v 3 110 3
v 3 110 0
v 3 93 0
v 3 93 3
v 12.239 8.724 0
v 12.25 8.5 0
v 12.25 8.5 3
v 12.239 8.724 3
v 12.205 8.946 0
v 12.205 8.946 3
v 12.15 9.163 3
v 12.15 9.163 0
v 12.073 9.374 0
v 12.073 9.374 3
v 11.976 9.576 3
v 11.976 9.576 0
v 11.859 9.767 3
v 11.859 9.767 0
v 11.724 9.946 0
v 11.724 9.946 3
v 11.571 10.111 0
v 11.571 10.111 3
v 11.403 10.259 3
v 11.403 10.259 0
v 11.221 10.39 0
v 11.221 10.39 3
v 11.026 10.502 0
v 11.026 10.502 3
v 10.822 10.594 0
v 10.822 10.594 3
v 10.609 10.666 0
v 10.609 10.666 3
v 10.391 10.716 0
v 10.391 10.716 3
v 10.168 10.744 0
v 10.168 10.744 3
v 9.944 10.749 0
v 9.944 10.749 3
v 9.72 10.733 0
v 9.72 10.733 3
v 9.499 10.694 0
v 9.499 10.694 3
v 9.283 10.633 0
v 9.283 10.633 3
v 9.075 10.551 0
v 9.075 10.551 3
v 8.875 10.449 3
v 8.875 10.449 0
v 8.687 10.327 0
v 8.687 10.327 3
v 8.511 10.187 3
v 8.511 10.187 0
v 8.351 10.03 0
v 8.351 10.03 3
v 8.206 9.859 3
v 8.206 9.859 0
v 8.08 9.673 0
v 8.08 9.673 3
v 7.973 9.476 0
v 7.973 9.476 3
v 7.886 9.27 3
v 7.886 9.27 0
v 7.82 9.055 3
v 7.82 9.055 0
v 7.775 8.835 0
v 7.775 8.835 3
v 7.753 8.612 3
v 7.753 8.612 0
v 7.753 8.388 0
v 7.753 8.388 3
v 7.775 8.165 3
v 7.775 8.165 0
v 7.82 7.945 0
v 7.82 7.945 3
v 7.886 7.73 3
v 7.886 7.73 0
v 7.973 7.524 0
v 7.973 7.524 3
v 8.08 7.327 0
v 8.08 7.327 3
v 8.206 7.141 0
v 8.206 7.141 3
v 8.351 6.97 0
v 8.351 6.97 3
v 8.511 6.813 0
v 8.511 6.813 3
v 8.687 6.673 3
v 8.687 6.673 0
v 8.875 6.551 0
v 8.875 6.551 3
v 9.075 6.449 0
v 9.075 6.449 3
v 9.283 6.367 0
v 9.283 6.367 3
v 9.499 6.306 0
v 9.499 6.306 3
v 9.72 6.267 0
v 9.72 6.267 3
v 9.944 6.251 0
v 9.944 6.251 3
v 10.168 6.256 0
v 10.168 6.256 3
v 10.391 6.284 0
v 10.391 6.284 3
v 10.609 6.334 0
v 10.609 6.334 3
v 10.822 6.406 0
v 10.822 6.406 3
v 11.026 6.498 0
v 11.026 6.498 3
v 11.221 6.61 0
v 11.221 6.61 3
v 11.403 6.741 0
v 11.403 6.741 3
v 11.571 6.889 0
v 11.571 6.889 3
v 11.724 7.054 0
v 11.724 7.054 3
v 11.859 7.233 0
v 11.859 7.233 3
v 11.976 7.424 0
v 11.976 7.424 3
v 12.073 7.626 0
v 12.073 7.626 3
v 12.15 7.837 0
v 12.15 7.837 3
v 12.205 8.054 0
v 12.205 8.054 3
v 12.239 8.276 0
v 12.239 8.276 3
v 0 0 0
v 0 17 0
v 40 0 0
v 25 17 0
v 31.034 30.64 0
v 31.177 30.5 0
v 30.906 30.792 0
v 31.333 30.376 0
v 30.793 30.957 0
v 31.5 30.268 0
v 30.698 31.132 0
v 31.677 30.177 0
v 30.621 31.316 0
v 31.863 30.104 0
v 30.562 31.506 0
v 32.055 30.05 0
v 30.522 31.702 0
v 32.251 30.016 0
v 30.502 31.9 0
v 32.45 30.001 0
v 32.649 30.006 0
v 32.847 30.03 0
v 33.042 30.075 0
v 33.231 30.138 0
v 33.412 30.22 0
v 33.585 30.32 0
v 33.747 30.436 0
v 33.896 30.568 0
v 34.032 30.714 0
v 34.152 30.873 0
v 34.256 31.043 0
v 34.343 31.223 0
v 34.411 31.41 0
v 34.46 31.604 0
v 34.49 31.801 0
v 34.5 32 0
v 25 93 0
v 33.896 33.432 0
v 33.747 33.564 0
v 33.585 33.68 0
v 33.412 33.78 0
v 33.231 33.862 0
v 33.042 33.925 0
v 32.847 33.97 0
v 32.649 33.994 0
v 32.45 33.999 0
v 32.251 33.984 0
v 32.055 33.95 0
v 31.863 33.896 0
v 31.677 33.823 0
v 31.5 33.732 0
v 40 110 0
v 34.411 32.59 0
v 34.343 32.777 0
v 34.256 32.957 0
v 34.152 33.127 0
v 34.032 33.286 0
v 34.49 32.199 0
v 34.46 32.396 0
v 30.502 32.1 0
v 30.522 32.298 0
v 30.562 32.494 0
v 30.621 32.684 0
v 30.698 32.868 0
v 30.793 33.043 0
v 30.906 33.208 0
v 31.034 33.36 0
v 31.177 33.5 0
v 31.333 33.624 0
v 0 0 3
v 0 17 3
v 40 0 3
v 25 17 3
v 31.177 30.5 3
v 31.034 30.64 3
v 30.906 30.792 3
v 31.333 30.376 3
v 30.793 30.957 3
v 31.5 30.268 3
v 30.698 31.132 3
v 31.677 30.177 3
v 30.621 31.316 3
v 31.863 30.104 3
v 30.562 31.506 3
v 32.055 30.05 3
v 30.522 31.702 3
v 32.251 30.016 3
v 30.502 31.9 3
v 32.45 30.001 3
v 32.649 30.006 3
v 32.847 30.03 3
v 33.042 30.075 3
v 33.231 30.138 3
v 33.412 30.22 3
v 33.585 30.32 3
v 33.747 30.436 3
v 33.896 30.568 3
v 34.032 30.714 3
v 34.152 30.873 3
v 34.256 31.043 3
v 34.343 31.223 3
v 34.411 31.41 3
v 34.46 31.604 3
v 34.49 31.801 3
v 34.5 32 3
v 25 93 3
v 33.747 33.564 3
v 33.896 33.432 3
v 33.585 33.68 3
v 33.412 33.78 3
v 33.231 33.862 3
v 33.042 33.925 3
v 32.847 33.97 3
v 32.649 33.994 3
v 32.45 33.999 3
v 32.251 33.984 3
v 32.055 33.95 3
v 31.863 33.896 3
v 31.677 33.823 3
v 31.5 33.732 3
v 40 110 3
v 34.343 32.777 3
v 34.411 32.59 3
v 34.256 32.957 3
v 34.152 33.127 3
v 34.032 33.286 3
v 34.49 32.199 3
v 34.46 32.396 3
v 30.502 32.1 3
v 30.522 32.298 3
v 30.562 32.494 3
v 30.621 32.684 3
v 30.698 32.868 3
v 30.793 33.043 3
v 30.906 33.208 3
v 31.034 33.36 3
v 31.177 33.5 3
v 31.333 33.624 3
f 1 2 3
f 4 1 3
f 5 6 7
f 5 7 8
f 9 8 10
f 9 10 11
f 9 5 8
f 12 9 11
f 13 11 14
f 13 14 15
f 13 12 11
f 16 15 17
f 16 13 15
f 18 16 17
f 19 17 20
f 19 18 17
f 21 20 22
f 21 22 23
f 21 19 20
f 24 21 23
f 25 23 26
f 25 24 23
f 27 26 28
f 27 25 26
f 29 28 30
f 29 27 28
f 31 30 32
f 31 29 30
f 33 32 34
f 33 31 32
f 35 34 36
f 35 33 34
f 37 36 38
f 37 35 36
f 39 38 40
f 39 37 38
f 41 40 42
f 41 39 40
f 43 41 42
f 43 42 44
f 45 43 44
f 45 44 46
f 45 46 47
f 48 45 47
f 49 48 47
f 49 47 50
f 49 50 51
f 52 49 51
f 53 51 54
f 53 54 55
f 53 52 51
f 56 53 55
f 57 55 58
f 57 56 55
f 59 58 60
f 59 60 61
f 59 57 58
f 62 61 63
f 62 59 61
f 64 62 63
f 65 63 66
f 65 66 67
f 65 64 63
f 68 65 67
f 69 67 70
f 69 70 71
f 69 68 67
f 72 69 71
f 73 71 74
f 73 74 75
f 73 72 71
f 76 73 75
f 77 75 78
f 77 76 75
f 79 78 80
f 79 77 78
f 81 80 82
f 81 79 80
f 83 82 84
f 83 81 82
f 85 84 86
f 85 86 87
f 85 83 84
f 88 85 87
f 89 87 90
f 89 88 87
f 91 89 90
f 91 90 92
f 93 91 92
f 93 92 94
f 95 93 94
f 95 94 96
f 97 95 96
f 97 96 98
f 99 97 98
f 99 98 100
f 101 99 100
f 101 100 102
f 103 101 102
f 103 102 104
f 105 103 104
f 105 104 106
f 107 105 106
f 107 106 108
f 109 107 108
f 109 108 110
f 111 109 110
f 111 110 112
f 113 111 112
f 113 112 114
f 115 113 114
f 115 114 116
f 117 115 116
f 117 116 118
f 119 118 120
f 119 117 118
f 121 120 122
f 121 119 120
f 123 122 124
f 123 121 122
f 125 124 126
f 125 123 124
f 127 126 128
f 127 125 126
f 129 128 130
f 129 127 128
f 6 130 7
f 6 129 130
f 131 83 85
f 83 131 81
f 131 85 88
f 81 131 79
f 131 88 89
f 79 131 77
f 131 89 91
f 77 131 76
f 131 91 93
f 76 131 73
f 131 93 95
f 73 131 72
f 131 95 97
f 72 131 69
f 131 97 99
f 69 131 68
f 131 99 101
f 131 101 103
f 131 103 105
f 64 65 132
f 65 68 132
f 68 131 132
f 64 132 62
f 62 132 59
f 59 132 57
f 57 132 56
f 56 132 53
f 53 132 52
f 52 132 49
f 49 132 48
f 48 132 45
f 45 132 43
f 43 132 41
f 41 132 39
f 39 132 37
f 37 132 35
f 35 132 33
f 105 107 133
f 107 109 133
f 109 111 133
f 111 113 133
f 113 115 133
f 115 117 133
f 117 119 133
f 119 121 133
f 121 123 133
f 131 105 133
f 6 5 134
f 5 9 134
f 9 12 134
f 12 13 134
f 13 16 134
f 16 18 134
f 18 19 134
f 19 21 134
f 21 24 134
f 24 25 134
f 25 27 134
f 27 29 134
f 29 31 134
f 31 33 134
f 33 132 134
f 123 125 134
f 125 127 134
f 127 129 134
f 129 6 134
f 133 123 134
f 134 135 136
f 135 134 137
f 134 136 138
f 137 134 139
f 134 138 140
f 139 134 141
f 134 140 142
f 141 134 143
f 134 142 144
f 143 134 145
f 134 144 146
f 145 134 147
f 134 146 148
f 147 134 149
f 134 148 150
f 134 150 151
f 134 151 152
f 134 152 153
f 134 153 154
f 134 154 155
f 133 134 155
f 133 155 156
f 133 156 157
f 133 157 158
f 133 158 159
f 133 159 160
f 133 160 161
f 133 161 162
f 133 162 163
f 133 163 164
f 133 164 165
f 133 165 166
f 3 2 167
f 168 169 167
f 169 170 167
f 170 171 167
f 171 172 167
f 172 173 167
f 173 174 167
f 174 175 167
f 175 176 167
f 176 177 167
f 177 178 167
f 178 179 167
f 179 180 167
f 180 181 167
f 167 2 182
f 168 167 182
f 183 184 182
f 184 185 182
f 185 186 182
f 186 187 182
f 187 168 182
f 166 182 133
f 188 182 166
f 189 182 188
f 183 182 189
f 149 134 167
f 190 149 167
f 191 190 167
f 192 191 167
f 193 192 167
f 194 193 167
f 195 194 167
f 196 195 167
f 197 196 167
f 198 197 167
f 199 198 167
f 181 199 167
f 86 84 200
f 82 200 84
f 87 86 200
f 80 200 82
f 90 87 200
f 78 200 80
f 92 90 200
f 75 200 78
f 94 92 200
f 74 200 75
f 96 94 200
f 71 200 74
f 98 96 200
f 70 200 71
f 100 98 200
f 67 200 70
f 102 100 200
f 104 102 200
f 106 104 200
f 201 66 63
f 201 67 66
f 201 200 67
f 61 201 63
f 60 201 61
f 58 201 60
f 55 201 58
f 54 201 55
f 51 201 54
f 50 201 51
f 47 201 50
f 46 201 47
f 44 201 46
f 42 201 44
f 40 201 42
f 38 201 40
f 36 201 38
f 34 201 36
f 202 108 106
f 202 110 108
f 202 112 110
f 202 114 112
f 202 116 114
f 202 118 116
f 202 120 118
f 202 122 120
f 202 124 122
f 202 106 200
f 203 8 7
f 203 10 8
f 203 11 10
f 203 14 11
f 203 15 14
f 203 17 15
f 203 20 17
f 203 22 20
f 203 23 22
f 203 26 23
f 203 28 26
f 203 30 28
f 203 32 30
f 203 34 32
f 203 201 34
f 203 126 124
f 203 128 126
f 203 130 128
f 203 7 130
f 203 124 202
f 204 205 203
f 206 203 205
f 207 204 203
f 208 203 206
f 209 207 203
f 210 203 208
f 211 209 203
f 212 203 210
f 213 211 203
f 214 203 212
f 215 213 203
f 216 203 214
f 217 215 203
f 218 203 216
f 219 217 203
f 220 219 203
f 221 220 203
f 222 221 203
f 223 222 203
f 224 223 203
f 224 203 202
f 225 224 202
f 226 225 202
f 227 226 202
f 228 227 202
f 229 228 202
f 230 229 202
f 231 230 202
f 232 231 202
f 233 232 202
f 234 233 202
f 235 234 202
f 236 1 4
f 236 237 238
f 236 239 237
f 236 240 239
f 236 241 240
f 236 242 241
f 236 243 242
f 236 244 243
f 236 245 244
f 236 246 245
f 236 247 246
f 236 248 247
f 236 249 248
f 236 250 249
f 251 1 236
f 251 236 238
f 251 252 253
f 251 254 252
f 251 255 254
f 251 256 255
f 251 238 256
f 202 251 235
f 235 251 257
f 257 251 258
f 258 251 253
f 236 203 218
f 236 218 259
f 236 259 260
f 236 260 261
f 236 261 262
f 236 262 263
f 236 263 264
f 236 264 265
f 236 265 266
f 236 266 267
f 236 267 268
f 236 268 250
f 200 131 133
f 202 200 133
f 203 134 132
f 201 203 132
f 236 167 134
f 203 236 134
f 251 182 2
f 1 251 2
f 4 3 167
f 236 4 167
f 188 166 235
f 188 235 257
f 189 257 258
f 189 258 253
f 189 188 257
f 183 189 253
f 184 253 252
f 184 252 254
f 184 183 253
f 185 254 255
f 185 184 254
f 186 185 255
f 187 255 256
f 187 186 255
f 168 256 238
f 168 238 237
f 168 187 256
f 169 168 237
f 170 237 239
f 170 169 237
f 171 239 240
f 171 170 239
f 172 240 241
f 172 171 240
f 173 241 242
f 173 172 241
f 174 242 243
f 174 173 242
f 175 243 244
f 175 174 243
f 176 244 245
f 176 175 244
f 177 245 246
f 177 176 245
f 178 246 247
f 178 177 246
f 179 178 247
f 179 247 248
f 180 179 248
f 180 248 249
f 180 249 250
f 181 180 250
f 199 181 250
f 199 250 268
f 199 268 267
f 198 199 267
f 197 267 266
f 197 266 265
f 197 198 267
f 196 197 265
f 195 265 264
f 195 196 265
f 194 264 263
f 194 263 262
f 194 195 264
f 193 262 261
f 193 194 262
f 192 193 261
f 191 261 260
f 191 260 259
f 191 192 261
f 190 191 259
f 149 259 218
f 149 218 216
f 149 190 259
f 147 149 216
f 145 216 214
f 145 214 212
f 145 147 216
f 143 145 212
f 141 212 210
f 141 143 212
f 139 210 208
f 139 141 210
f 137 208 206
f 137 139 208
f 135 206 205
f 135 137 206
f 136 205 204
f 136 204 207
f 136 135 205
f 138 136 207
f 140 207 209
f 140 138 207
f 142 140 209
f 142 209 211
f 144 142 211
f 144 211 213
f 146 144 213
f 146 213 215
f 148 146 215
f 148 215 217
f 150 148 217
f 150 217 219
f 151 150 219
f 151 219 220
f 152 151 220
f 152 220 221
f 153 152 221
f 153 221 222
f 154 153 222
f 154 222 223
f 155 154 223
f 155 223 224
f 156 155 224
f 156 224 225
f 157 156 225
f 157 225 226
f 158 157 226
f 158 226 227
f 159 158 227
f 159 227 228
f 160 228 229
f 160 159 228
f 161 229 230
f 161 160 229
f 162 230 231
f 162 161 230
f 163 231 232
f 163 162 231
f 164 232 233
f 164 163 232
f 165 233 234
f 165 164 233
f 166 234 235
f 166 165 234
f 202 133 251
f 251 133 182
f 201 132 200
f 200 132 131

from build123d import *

# Parameters (mm, degrees)
CROQUIS1_R              = 2.25
CROQUIS1_R_2            = 2
SALIENTE_EXTRUIR1_DEPTH = 3


with BuildPart() as part:
    # Croquis1 → Saliente-Extruir1 (new body)
    with BuildSketch(Plane.XY):
        Polygon((0, 0), (40, 0), (40, 110), (23, 110), (3, 110), (3, 93), (25, 93), (25, 17), (0, 17), align=None)
        with Locations((10, 8.5)):
            Circle(CROQUIS1_R, mode=Mode.SUBTRACT)
        with Locations((32.5, 32)):
            Circle(CROQUIS1_R_2, mode=Mode.SUBTRACT)
    extrude(amount=SALIENTE_EXTRUIR1_DEPTH)


solid = part.part
